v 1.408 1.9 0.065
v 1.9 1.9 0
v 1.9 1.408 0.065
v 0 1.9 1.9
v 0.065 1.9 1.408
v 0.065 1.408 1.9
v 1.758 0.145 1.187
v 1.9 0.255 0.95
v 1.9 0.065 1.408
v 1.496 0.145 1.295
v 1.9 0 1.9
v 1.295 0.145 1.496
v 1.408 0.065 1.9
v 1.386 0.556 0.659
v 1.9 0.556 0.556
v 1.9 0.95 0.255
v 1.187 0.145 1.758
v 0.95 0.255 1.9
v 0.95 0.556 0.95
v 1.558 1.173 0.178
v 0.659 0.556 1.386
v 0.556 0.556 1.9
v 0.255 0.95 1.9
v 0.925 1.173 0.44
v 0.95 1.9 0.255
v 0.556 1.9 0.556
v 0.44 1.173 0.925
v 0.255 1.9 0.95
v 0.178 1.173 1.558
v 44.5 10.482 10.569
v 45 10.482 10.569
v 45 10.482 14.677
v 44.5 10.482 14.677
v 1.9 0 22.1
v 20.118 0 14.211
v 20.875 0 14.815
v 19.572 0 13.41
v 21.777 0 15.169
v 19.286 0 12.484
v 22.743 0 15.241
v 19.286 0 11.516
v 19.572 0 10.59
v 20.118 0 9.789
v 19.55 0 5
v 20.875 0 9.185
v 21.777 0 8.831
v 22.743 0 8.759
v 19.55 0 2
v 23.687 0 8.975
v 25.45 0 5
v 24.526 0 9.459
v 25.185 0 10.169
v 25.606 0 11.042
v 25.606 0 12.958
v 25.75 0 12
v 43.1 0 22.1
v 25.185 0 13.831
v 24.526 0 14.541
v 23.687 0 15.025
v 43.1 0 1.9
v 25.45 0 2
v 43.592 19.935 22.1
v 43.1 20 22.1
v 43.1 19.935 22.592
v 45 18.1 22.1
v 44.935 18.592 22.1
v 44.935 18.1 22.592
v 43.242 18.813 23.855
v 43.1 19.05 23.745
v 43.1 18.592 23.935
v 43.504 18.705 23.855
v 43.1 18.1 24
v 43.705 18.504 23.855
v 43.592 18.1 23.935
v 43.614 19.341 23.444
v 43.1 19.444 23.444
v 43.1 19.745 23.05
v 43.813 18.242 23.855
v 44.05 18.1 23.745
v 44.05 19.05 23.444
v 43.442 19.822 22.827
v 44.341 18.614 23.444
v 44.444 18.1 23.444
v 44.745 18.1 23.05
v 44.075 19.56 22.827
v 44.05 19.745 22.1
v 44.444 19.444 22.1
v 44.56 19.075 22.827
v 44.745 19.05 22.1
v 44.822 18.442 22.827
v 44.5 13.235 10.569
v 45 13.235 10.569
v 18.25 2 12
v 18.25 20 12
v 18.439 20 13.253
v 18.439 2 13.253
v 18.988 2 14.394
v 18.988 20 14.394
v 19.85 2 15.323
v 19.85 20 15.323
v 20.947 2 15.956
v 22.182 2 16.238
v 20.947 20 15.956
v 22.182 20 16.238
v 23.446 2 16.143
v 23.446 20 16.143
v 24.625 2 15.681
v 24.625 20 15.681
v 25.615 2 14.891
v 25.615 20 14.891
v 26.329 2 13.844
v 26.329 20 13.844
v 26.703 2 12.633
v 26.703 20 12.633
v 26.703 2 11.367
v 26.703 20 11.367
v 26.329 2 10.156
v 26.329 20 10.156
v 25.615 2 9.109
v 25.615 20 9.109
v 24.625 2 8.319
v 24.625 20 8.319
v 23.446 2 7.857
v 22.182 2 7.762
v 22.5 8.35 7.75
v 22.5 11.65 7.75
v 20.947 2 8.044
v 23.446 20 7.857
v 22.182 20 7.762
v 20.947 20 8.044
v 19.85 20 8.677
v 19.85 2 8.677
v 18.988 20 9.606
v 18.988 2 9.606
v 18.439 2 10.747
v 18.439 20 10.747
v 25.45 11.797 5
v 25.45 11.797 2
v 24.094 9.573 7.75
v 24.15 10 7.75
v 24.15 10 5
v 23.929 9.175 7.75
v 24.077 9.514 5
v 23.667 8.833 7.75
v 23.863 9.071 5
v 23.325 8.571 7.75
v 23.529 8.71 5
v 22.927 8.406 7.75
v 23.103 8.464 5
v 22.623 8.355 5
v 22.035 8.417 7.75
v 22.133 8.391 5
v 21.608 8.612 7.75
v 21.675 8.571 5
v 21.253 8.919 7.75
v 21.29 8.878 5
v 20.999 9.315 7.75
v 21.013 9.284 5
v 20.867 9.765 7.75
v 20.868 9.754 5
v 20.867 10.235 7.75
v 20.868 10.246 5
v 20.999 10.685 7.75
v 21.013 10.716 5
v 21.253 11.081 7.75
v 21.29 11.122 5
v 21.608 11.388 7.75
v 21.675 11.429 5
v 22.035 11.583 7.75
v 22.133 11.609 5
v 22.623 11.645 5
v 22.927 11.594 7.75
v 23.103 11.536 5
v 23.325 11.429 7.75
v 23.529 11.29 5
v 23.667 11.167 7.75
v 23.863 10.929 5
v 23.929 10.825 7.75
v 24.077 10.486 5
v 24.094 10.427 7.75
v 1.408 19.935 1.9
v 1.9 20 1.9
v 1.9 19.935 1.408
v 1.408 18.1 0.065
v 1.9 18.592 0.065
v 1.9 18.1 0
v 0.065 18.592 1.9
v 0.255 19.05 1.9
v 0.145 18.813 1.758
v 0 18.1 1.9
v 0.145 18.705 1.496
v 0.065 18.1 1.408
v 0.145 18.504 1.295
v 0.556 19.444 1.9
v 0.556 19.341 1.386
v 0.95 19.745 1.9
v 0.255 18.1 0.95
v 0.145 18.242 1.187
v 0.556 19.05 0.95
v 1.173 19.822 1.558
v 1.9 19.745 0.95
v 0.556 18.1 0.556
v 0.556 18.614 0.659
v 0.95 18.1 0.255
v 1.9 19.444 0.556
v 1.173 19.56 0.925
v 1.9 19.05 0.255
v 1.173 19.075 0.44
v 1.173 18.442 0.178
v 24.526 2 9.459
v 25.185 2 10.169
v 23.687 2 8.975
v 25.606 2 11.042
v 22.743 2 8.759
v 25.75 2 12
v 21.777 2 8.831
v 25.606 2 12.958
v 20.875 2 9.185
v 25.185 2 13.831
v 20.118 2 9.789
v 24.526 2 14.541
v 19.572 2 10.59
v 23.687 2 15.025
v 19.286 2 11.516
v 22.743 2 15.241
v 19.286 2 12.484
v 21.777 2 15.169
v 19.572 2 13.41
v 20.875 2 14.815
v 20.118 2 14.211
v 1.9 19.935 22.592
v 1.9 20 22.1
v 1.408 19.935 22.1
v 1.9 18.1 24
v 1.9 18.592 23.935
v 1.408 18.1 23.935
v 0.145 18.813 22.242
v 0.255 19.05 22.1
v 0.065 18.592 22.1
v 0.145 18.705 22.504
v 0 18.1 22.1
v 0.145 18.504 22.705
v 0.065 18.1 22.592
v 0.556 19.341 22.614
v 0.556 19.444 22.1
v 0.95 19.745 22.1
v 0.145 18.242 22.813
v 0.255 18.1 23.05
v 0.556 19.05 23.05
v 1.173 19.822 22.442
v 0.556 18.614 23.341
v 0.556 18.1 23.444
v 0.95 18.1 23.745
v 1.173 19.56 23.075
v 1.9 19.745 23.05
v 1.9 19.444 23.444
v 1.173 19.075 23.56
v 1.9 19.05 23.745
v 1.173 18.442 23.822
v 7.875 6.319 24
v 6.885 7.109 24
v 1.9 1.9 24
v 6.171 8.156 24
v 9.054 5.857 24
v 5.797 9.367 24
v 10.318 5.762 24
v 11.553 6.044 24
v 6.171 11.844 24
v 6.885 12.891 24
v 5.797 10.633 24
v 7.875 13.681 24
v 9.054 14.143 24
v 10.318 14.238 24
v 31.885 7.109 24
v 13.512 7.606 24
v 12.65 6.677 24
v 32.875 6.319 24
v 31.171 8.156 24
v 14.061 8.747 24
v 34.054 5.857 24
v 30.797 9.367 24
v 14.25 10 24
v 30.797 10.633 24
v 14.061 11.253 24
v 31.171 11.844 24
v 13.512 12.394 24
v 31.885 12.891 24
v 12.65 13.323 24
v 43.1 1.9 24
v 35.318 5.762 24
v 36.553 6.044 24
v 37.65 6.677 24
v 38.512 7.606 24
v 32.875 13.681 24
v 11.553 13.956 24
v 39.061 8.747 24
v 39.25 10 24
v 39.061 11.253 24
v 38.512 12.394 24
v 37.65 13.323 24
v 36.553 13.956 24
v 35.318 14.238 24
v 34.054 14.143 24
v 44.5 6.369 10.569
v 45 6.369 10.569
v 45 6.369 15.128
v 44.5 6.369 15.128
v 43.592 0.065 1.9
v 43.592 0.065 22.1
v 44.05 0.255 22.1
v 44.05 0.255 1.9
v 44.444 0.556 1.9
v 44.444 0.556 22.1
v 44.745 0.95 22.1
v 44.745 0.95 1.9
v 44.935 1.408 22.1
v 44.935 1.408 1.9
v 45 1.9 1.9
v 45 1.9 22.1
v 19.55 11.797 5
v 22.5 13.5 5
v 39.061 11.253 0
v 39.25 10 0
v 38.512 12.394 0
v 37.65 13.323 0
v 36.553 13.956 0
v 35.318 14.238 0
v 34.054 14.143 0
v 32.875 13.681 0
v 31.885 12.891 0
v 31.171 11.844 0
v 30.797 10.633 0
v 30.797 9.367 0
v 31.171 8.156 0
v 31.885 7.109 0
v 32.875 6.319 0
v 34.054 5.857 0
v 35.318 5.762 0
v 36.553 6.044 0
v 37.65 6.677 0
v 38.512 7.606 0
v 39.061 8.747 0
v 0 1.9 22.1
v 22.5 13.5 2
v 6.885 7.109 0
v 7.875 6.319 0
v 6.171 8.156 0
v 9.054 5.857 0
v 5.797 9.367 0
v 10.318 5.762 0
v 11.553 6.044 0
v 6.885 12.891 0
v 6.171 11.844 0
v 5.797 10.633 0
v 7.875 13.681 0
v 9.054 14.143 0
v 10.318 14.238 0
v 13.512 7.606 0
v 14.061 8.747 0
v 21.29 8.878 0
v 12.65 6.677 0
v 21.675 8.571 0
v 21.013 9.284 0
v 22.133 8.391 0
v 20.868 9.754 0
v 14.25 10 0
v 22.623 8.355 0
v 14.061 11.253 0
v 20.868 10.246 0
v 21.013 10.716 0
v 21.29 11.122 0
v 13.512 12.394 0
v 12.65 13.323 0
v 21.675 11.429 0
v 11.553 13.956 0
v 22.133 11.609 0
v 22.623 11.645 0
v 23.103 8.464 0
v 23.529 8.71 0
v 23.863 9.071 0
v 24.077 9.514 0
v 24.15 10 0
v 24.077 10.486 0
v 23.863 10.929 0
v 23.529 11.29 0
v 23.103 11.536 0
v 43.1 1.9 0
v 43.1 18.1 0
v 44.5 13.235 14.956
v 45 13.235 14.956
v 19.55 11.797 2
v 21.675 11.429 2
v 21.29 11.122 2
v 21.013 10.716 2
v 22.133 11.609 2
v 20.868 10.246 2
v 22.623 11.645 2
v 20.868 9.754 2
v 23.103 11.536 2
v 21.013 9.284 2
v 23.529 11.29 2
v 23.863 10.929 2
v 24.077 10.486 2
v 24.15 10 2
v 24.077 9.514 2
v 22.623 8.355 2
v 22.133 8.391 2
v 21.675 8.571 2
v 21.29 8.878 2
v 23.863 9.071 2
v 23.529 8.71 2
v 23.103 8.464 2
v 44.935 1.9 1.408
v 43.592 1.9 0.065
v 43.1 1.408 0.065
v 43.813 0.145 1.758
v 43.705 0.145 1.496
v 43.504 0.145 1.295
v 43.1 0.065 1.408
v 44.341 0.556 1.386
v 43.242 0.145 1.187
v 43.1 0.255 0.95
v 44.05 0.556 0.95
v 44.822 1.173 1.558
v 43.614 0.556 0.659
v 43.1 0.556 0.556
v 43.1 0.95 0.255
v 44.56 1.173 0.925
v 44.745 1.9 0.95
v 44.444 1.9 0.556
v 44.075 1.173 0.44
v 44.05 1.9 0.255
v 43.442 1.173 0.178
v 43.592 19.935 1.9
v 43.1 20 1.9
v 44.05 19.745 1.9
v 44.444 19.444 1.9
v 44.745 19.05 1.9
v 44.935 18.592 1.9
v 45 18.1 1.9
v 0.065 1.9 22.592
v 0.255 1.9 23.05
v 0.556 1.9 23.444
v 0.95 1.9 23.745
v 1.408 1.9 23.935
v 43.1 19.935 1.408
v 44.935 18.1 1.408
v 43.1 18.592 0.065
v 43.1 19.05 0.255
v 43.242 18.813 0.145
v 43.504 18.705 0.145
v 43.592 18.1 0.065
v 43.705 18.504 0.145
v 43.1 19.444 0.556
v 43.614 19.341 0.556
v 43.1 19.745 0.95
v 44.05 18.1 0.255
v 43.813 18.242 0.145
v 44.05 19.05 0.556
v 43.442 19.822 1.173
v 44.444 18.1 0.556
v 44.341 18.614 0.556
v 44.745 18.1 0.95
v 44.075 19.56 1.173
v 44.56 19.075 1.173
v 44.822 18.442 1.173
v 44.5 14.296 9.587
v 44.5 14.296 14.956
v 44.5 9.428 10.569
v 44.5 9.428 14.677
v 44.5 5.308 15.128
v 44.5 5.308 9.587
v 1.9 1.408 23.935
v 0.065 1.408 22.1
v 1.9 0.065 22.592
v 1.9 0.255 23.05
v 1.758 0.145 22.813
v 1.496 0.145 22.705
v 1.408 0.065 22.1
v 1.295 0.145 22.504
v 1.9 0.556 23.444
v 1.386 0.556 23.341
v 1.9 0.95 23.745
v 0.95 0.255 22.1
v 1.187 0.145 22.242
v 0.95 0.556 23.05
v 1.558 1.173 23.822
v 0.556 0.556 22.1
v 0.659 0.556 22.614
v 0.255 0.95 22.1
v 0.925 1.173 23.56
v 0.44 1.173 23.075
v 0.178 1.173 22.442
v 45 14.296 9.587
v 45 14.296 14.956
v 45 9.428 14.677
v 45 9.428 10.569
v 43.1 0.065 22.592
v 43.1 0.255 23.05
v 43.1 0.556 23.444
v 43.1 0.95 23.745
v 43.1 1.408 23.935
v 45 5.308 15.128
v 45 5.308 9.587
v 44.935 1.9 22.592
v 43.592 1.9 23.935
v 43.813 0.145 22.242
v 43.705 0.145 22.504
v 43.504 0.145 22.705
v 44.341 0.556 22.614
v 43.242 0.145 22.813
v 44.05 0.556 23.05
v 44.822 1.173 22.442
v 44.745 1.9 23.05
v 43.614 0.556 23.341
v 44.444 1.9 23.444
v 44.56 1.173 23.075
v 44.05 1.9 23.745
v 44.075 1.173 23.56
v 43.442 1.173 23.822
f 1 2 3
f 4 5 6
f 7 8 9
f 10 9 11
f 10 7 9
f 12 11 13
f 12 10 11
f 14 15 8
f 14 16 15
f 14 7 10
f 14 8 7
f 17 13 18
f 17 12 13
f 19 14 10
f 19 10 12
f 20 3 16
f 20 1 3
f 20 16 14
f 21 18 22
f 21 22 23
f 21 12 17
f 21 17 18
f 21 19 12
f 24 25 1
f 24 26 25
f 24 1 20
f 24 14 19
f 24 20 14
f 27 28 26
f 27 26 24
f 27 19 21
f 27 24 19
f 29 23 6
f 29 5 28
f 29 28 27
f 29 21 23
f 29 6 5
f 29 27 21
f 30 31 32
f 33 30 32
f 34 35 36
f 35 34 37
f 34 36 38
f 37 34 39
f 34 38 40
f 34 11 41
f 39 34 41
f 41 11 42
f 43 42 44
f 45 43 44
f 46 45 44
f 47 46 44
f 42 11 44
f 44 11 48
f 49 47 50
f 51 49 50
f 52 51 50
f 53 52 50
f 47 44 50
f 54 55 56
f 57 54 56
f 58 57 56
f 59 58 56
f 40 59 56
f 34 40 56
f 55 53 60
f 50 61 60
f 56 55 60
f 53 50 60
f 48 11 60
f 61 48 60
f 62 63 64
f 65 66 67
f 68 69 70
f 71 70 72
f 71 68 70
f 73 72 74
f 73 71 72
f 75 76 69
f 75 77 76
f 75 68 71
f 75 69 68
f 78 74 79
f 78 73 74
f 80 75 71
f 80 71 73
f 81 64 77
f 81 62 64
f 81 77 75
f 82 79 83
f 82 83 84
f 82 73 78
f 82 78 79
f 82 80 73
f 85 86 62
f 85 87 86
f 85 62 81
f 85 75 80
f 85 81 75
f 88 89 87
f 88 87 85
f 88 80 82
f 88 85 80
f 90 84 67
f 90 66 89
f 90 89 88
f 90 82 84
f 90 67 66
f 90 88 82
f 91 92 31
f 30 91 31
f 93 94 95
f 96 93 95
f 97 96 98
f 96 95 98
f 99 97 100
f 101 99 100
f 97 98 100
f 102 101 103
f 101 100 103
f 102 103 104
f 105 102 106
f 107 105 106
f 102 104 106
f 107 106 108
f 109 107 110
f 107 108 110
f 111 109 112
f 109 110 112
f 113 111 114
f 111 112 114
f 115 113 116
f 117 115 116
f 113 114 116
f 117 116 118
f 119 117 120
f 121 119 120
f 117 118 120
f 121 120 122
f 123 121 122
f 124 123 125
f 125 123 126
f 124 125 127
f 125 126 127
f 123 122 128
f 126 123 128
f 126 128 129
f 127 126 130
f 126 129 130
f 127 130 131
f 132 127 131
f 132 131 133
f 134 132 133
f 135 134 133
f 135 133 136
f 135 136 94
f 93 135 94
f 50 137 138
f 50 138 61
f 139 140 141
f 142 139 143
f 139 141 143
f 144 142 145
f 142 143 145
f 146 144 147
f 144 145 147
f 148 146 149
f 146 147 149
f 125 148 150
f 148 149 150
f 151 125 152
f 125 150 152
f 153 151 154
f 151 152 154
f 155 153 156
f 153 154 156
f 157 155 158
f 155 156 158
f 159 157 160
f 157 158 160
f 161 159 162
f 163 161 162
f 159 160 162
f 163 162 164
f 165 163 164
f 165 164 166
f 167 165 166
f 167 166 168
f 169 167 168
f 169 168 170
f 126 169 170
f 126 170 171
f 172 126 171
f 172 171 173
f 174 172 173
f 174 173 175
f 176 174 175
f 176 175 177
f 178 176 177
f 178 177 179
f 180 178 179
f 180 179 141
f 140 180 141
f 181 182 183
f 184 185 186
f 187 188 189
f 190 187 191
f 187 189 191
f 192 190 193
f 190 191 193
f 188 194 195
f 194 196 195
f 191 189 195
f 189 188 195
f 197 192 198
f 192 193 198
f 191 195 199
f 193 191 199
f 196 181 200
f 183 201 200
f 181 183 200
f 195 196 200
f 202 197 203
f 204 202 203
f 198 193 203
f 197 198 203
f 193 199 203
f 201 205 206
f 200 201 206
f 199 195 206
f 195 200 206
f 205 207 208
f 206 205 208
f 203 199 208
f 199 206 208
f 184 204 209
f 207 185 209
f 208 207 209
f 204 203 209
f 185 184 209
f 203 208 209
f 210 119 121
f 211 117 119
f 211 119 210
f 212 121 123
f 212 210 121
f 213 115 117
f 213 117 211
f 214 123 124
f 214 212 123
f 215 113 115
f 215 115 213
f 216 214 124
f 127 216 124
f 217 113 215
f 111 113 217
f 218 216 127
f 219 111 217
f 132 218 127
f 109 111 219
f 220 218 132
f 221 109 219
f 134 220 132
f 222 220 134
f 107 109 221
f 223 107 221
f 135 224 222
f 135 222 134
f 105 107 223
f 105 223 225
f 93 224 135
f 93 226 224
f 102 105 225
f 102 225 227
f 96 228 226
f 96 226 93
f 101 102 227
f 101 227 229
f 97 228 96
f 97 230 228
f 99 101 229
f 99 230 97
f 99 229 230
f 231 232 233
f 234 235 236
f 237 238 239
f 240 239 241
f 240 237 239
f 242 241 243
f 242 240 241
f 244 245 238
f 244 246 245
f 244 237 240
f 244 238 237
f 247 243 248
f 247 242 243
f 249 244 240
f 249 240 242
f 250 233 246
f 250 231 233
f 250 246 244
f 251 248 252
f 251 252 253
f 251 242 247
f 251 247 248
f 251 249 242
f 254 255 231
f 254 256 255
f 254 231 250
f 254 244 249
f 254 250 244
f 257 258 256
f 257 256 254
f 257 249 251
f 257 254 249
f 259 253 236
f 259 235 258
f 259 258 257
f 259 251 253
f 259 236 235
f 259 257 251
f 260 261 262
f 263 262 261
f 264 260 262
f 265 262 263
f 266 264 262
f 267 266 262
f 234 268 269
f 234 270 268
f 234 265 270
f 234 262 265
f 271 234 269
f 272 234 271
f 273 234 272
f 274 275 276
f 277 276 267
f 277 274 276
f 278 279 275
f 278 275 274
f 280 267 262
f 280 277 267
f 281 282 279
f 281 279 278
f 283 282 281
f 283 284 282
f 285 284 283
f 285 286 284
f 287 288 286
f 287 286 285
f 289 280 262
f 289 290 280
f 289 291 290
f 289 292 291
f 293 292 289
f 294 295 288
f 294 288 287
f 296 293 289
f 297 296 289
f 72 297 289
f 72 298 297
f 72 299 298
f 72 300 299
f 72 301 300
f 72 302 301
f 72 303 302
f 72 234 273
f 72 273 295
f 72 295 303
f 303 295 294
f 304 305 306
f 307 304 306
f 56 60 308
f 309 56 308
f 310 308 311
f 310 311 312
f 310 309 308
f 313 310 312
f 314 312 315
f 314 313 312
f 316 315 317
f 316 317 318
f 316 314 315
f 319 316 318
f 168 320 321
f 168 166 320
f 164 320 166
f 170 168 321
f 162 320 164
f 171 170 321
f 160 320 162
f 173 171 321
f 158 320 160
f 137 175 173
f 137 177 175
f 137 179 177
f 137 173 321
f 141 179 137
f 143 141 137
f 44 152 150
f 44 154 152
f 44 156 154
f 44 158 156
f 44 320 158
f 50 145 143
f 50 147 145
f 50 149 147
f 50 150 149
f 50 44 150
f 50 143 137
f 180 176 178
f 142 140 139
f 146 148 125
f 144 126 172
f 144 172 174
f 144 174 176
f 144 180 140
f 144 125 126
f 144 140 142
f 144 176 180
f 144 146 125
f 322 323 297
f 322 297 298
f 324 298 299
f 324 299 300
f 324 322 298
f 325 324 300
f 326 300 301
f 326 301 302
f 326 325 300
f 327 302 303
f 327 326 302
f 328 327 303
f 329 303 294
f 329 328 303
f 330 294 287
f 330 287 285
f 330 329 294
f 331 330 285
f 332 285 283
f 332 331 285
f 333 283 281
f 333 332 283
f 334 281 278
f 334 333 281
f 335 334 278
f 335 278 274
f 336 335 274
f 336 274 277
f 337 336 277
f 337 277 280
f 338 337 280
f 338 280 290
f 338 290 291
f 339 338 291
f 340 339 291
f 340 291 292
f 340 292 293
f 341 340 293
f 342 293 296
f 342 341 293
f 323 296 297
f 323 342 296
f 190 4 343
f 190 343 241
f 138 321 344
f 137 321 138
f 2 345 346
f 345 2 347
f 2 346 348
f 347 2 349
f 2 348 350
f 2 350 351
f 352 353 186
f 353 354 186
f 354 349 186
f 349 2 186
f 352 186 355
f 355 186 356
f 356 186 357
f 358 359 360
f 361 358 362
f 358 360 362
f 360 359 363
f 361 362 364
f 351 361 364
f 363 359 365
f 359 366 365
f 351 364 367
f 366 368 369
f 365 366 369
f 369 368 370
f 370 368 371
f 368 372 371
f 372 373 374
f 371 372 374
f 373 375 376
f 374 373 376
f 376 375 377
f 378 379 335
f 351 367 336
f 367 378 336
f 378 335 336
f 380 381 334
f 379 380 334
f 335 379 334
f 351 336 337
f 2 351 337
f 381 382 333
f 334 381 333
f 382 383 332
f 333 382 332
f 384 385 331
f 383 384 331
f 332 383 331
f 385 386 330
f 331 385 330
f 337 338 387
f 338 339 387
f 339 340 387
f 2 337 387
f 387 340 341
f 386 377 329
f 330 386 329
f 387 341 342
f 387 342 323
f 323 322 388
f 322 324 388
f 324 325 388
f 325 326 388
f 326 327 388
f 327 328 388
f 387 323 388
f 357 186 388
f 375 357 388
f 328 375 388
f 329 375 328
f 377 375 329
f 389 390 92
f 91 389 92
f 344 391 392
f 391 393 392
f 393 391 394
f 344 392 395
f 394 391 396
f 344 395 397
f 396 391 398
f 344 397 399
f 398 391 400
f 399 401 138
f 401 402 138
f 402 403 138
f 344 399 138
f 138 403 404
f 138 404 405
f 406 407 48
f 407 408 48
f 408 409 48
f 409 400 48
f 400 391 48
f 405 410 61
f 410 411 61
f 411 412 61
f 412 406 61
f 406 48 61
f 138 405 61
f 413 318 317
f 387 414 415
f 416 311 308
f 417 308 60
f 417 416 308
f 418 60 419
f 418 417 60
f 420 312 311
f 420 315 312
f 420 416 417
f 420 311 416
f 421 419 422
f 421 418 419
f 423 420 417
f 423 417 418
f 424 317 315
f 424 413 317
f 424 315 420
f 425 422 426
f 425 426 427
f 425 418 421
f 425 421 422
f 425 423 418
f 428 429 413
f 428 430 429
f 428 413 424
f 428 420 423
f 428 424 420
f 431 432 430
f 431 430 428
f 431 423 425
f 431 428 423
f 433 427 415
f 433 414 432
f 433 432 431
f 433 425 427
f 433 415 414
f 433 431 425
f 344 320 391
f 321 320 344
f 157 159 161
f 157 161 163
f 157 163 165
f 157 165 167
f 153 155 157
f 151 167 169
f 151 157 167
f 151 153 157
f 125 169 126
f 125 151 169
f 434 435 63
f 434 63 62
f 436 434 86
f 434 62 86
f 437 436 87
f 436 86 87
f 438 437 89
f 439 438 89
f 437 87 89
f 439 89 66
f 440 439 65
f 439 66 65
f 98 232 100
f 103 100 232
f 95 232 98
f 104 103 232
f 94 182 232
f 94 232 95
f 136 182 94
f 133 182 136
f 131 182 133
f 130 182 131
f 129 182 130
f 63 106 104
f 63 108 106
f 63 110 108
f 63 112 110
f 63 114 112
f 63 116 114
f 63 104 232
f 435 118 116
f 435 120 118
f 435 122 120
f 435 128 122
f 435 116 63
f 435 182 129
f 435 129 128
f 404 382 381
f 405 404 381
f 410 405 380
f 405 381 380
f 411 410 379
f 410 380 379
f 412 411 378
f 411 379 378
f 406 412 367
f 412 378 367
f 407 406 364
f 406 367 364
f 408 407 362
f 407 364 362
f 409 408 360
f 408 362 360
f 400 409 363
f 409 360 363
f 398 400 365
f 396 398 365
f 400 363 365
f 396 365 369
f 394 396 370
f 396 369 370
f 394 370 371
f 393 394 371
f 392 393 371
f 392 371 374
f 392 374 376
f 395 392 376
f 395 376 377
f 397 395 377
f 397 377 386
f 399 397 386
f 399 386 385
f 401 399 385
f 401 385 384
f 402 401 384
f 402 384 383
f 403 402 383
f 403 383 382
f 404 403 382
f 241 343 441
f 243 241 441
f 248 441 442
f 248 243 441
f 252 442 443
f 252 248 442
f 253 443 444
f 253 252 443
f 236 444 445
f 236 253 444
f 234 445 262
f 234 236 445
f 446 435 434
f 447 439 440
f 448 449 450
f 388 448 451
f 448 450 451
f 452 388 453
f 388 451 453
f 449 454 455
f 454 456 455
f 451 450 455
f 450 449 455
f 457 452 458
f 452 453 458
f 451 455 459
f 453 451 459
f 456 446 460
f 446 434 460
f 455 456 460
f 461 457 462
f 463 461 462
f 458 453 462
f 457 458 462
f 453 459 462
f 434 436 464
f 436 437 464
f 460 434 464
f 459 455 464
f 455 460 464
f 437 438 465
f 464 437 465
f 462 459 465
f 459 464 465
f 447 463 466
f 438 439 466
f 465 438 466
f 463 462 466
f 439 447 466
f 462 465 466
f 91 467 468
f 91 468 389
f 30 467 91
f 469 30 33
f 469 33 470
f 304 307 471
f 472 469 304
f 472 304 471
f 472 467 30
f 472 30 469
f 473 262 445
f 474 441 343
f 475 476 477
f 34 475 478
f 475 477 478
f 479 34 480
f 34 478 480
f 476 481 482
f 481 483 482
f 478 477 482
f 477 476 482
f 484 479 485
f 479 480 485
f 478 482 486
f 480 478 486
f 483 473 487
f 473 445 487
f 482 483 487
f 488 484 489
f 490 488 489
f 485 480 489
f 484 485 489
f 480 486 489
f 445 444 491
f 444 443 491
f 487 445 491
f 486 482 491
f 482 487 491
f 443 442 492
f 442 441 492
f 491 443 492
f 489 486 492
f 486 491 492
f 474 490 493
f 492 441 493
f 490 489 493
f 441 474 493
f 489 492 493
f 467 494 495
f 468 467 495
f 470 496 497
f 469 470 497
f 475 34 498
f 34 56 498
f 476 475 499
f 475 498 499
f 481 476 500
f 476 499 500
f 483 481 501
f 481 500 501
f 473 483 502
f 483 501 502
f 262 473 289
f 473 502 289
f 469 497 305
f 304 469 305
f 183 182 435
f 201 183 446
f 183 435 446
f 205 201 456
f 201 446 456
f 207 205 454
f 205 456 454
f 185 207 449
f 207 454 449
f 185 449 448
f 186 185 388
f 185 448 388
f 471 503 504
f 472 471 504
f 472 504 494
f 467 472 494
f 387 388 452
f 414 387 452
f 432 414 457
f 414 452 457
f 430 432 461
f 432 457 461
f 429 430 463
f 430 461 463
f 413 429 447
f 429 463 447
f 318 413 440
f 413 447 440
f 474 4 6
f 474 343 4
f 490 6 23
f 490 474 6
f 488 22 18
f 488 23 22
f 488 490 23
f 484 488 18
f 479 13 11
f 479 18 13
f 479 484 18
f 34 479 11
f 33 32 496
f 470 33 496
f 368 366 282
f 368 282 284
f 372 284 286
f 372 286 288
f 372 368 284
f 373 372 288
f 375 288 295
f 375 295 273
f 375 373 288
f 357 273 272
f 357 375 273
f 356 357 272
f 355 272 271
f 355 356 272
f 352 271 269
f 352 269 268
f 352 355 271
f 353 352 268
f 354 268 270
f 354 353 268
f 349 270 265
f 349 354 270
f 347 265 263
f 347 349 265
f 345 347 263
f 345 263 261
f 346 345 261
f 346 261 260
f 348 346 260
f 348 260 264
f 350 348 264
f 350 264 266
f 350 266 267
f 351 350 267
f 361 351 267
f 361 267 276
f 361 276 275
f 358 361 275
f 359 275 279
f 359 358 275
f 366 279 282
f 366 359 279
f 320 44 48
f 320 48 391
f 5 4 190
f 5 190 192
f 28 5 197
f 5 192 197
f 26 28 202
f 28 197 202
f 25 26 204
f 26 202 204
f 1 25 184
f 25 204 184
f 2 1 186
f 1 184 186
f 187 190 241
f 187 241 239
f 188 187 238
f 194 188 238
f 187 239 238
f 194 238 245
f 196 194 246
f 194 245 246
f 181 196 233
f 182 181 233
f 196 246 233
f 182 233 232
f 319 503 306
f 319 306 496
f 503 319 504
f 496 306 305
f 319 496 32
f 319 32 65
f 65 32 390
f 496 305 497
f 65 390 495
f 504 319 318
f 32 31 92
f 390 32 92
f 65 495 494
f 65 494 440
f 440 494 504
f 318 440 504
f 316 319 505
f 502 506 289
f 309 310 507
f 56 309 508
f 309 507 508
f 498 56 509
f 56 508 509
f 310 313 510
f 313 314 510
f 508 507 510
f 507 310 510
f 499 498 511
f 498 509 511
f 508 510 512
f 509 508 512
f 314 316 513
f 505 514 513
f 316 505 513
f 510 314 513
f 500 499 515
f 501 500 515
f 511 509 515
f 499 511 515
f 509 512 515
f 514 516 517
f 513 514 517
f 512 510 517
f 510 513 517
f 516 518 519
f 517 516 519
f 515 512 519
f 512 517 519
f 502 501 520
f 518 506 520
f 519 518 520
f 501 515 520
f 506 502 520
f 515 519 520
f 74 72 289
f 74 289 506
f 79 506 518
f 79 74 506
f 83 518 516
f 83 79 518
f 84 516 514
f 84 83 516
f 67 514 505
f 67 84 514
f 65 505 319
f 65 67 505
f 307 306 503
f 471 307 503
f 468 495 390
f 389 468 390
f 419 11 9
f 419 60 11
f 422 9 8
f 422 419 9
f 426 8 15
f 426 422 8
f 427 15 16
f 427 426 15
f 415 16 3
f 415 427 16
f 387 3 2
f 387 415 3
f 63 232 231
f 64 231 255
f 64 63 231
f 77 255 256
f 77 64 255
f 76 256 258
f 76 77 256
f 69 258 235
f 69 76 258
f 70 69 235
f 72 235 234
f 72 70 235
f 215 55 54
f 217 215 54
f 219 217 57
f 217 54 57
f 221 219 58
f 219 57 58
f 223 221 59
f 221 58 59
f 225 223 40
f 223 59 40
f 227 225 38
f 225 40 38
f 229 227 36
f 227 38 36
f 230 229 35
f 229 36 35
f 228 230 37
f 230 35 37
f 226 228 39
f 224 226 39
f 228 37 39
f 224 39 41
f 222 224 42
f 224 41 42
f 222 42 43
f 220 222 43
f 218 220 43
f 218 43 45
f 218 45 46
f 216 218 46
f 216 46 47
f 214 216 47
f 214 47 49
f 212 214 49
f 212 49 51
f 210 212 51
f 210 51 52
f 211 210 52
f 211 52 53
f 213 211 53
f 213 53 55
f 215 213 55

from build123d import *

# Parameters (mm, degrees)
EXTRUDE001_DEPTH = 0.5
PAD001_DEPTH     = 3
SKETCH_W         = 45
SKETCH_H         = 20
SKETCH_R         = 4.25
PAD_DEPTH        = 24
SKETCH001_R      = 3.25
POCKET_DEPTH     = 20.001
SKETCH003_R      = 4.25
POCKET001_DEPTH  = 18
SKETCH004_R      = 1.65
POCKET002_DEPTH  = 7.75
FILLET_R         = 1.9


with BuildPart() as letra_e_extruida:
    # path2990 → Extrude001 (new body)
    with BuildSketch(Plane(origin=(45, 9.801935, 12.357409), x_dir=(0, -1, 0), z_dir=(1, 0, 0))):
        with BuildLine():
            add(Edge.make_bspline(
                [(4.49398, 2.770757), (-4.49398, 2.770757)],
                knots=[0, 0, 28.94756, 28.94756], degree=1))
            add(Edge.make_bspline(
                [(-4.49398, 2.770757), (-4.49398, -2.598535)],
                knots=[0, 0, 20.9307, 20.9307], degree=1))
            add(Edge.make_bspline(
                [(-4.49398, -2.598535), (-3.433327, -2.598535)],
                knots=[0, 0, 3.41605, 3.41605], degree=1))
            add(Edge.make_bspline(
                [(-3.433327, -2.598535), (-3.433327, 1.788076)],
                knots=[0, 0, 17.09999, 17.09999], degree=1))
            add(Edge.make_bspline(
                [(-3.433327, 1.788076), (-0.680535, 1.788076)],
                knots=[0, 0, 8.86593, 8.86593], degree=1))
            add(Edge.make_bspline(
                [(-0.680535, 1.788076), (-0.680535, -2.319939)],
                knots=[0, 0, 16.01396, 16.01396], degree=1))
            add(Edge.make_bspline(
                [(-0.680535, -2.319939), (0.373986, -2.319939)],
                knots=[0, 0, 3.3963, 3.3963], degree=1))
            add(Edge.make_bspline(
                [(0.373986, -2.319939), (0.373986, 1.788076)],
                knots=[0, 0, 16.01396, 16.01396], degree=1))
            add(Edge.make_bspline(
                [(0.373986, 1.788076), (3.433327, 1.788076)],
                knots=[0, 0, 9.85323, 9.85323], degree=1))
            add(Edge.make_bspline(
                [(3.433327, 1.788076), (3.433327, -2.770757)],
                knots=[0, 0, 17.77135, 17.77135], degree=1))
            add(Edge.make_bspline(
                [(3.433327, -2.770757), (4.49398, -2.770757)],
                knots=[0, 0, 3.41605, 3.41605], degree=1))
            add(Edge.make_bspline(
                [(4.49398, -2.770757), (4.49398, 2.770757)],
                knots=[0, 0, 21.60206, 21.60206], degree=1))
        make_face()
    extrude(amount=-EXTRUDE001_DEPTH)


with BuildPart() as alojamiento_tuerca_m3:
    # Sketch005 → Pad001 (new body)
    with BuildSketch(Plane(origin=(22.5, 13.5, 5), x_dir=(1, 0, 0), z_dir=(0, 0, -1))):
        Polygon((-2.95, 14.703183), (-2.95, 1.703183), (0, 0), (2.95, 1.703183), (2.95, 14.703183), align=None)
    extrude(amount=PAD001_DEPTH)


with BuildPart() as redondeo_de_bordes:
    # Sketch → Pad (new body)
    with BuildSketch(Plane.XY):
        with Locations((22.5, 10)):
            Rectangle(SKETCH_W, SKETCH_H)
        with Locations((10, 10)):
            Circle(SKETCH_R, mode=Mode.SUBTRACT)
        with Locations((35, 10)):
            Circle(SKETCH_R, mode=Mode.SUBTRACT)
    extrude(amount=PAD_DEPTH)

    # Sketch001 → Pocket (cut, through all)
    with BuildSketch(Plane.XZ):
        with Locations((22.5, 12)):
            Circle(SKETCH001_R)
    extrude(amount=-POCKET_DEPTH, mode=Mode.SUBTRACT)

    # Sketch003 → Pocket001 (cut)
    with BuildSketch(Plane(origin=(0, 20, 0), x_dir=(-1, 0, 0), z_dir=(0, 1, 0))):
        with Locations((-22.5, 12)):
            Circle(SKETCH003_R)
    extrude(amount=-POCKET001_DEPTH, mode=Mode.SUBTRACT)

    # Sketch004 → Pocket002 (cut)
    with BuildSketch(Plane(origin=(0, 0, 0), x_dir=(1, 0, 0), z_dir=(0, 0, -1))):
        with Locations((22.5, -10)):
            Circle(SKETCH004_R)
    extrude(amount=-POCKET002_DEPTH, mode=Mode.SUBTRACT)

    # Cut: cut Alojamiento tuerca M3
    add(alojamiento_tuerca_m3.part, mode=Mode.SUBTRACT)

    # Cut001: cut Letra E extruida
    add(letra_e_extruida.part, mode=Mode.SUBTRACT)

    # Fillet
    fillet_edges = [redondeo_de_bordes.edges().sort_by_distance(p)[0] for p in [
        (45, 20, 12),
        (22.5, 20, 0),
        (22.5, 20, 24),
        (0, 20, 12),
        (45, 10, 0),
        (45, 10, 24),
        (45, 0, 12),
        (0, 10, 0),
        (22.5, 0, 0),
        (0, 10, 24),
        (22.5, 0, 24),
        (0, 0, 12),
    ]]
    fillet(fillet_edges, radius=FILLET_R)


solid = redondeo_de_bordes.part
